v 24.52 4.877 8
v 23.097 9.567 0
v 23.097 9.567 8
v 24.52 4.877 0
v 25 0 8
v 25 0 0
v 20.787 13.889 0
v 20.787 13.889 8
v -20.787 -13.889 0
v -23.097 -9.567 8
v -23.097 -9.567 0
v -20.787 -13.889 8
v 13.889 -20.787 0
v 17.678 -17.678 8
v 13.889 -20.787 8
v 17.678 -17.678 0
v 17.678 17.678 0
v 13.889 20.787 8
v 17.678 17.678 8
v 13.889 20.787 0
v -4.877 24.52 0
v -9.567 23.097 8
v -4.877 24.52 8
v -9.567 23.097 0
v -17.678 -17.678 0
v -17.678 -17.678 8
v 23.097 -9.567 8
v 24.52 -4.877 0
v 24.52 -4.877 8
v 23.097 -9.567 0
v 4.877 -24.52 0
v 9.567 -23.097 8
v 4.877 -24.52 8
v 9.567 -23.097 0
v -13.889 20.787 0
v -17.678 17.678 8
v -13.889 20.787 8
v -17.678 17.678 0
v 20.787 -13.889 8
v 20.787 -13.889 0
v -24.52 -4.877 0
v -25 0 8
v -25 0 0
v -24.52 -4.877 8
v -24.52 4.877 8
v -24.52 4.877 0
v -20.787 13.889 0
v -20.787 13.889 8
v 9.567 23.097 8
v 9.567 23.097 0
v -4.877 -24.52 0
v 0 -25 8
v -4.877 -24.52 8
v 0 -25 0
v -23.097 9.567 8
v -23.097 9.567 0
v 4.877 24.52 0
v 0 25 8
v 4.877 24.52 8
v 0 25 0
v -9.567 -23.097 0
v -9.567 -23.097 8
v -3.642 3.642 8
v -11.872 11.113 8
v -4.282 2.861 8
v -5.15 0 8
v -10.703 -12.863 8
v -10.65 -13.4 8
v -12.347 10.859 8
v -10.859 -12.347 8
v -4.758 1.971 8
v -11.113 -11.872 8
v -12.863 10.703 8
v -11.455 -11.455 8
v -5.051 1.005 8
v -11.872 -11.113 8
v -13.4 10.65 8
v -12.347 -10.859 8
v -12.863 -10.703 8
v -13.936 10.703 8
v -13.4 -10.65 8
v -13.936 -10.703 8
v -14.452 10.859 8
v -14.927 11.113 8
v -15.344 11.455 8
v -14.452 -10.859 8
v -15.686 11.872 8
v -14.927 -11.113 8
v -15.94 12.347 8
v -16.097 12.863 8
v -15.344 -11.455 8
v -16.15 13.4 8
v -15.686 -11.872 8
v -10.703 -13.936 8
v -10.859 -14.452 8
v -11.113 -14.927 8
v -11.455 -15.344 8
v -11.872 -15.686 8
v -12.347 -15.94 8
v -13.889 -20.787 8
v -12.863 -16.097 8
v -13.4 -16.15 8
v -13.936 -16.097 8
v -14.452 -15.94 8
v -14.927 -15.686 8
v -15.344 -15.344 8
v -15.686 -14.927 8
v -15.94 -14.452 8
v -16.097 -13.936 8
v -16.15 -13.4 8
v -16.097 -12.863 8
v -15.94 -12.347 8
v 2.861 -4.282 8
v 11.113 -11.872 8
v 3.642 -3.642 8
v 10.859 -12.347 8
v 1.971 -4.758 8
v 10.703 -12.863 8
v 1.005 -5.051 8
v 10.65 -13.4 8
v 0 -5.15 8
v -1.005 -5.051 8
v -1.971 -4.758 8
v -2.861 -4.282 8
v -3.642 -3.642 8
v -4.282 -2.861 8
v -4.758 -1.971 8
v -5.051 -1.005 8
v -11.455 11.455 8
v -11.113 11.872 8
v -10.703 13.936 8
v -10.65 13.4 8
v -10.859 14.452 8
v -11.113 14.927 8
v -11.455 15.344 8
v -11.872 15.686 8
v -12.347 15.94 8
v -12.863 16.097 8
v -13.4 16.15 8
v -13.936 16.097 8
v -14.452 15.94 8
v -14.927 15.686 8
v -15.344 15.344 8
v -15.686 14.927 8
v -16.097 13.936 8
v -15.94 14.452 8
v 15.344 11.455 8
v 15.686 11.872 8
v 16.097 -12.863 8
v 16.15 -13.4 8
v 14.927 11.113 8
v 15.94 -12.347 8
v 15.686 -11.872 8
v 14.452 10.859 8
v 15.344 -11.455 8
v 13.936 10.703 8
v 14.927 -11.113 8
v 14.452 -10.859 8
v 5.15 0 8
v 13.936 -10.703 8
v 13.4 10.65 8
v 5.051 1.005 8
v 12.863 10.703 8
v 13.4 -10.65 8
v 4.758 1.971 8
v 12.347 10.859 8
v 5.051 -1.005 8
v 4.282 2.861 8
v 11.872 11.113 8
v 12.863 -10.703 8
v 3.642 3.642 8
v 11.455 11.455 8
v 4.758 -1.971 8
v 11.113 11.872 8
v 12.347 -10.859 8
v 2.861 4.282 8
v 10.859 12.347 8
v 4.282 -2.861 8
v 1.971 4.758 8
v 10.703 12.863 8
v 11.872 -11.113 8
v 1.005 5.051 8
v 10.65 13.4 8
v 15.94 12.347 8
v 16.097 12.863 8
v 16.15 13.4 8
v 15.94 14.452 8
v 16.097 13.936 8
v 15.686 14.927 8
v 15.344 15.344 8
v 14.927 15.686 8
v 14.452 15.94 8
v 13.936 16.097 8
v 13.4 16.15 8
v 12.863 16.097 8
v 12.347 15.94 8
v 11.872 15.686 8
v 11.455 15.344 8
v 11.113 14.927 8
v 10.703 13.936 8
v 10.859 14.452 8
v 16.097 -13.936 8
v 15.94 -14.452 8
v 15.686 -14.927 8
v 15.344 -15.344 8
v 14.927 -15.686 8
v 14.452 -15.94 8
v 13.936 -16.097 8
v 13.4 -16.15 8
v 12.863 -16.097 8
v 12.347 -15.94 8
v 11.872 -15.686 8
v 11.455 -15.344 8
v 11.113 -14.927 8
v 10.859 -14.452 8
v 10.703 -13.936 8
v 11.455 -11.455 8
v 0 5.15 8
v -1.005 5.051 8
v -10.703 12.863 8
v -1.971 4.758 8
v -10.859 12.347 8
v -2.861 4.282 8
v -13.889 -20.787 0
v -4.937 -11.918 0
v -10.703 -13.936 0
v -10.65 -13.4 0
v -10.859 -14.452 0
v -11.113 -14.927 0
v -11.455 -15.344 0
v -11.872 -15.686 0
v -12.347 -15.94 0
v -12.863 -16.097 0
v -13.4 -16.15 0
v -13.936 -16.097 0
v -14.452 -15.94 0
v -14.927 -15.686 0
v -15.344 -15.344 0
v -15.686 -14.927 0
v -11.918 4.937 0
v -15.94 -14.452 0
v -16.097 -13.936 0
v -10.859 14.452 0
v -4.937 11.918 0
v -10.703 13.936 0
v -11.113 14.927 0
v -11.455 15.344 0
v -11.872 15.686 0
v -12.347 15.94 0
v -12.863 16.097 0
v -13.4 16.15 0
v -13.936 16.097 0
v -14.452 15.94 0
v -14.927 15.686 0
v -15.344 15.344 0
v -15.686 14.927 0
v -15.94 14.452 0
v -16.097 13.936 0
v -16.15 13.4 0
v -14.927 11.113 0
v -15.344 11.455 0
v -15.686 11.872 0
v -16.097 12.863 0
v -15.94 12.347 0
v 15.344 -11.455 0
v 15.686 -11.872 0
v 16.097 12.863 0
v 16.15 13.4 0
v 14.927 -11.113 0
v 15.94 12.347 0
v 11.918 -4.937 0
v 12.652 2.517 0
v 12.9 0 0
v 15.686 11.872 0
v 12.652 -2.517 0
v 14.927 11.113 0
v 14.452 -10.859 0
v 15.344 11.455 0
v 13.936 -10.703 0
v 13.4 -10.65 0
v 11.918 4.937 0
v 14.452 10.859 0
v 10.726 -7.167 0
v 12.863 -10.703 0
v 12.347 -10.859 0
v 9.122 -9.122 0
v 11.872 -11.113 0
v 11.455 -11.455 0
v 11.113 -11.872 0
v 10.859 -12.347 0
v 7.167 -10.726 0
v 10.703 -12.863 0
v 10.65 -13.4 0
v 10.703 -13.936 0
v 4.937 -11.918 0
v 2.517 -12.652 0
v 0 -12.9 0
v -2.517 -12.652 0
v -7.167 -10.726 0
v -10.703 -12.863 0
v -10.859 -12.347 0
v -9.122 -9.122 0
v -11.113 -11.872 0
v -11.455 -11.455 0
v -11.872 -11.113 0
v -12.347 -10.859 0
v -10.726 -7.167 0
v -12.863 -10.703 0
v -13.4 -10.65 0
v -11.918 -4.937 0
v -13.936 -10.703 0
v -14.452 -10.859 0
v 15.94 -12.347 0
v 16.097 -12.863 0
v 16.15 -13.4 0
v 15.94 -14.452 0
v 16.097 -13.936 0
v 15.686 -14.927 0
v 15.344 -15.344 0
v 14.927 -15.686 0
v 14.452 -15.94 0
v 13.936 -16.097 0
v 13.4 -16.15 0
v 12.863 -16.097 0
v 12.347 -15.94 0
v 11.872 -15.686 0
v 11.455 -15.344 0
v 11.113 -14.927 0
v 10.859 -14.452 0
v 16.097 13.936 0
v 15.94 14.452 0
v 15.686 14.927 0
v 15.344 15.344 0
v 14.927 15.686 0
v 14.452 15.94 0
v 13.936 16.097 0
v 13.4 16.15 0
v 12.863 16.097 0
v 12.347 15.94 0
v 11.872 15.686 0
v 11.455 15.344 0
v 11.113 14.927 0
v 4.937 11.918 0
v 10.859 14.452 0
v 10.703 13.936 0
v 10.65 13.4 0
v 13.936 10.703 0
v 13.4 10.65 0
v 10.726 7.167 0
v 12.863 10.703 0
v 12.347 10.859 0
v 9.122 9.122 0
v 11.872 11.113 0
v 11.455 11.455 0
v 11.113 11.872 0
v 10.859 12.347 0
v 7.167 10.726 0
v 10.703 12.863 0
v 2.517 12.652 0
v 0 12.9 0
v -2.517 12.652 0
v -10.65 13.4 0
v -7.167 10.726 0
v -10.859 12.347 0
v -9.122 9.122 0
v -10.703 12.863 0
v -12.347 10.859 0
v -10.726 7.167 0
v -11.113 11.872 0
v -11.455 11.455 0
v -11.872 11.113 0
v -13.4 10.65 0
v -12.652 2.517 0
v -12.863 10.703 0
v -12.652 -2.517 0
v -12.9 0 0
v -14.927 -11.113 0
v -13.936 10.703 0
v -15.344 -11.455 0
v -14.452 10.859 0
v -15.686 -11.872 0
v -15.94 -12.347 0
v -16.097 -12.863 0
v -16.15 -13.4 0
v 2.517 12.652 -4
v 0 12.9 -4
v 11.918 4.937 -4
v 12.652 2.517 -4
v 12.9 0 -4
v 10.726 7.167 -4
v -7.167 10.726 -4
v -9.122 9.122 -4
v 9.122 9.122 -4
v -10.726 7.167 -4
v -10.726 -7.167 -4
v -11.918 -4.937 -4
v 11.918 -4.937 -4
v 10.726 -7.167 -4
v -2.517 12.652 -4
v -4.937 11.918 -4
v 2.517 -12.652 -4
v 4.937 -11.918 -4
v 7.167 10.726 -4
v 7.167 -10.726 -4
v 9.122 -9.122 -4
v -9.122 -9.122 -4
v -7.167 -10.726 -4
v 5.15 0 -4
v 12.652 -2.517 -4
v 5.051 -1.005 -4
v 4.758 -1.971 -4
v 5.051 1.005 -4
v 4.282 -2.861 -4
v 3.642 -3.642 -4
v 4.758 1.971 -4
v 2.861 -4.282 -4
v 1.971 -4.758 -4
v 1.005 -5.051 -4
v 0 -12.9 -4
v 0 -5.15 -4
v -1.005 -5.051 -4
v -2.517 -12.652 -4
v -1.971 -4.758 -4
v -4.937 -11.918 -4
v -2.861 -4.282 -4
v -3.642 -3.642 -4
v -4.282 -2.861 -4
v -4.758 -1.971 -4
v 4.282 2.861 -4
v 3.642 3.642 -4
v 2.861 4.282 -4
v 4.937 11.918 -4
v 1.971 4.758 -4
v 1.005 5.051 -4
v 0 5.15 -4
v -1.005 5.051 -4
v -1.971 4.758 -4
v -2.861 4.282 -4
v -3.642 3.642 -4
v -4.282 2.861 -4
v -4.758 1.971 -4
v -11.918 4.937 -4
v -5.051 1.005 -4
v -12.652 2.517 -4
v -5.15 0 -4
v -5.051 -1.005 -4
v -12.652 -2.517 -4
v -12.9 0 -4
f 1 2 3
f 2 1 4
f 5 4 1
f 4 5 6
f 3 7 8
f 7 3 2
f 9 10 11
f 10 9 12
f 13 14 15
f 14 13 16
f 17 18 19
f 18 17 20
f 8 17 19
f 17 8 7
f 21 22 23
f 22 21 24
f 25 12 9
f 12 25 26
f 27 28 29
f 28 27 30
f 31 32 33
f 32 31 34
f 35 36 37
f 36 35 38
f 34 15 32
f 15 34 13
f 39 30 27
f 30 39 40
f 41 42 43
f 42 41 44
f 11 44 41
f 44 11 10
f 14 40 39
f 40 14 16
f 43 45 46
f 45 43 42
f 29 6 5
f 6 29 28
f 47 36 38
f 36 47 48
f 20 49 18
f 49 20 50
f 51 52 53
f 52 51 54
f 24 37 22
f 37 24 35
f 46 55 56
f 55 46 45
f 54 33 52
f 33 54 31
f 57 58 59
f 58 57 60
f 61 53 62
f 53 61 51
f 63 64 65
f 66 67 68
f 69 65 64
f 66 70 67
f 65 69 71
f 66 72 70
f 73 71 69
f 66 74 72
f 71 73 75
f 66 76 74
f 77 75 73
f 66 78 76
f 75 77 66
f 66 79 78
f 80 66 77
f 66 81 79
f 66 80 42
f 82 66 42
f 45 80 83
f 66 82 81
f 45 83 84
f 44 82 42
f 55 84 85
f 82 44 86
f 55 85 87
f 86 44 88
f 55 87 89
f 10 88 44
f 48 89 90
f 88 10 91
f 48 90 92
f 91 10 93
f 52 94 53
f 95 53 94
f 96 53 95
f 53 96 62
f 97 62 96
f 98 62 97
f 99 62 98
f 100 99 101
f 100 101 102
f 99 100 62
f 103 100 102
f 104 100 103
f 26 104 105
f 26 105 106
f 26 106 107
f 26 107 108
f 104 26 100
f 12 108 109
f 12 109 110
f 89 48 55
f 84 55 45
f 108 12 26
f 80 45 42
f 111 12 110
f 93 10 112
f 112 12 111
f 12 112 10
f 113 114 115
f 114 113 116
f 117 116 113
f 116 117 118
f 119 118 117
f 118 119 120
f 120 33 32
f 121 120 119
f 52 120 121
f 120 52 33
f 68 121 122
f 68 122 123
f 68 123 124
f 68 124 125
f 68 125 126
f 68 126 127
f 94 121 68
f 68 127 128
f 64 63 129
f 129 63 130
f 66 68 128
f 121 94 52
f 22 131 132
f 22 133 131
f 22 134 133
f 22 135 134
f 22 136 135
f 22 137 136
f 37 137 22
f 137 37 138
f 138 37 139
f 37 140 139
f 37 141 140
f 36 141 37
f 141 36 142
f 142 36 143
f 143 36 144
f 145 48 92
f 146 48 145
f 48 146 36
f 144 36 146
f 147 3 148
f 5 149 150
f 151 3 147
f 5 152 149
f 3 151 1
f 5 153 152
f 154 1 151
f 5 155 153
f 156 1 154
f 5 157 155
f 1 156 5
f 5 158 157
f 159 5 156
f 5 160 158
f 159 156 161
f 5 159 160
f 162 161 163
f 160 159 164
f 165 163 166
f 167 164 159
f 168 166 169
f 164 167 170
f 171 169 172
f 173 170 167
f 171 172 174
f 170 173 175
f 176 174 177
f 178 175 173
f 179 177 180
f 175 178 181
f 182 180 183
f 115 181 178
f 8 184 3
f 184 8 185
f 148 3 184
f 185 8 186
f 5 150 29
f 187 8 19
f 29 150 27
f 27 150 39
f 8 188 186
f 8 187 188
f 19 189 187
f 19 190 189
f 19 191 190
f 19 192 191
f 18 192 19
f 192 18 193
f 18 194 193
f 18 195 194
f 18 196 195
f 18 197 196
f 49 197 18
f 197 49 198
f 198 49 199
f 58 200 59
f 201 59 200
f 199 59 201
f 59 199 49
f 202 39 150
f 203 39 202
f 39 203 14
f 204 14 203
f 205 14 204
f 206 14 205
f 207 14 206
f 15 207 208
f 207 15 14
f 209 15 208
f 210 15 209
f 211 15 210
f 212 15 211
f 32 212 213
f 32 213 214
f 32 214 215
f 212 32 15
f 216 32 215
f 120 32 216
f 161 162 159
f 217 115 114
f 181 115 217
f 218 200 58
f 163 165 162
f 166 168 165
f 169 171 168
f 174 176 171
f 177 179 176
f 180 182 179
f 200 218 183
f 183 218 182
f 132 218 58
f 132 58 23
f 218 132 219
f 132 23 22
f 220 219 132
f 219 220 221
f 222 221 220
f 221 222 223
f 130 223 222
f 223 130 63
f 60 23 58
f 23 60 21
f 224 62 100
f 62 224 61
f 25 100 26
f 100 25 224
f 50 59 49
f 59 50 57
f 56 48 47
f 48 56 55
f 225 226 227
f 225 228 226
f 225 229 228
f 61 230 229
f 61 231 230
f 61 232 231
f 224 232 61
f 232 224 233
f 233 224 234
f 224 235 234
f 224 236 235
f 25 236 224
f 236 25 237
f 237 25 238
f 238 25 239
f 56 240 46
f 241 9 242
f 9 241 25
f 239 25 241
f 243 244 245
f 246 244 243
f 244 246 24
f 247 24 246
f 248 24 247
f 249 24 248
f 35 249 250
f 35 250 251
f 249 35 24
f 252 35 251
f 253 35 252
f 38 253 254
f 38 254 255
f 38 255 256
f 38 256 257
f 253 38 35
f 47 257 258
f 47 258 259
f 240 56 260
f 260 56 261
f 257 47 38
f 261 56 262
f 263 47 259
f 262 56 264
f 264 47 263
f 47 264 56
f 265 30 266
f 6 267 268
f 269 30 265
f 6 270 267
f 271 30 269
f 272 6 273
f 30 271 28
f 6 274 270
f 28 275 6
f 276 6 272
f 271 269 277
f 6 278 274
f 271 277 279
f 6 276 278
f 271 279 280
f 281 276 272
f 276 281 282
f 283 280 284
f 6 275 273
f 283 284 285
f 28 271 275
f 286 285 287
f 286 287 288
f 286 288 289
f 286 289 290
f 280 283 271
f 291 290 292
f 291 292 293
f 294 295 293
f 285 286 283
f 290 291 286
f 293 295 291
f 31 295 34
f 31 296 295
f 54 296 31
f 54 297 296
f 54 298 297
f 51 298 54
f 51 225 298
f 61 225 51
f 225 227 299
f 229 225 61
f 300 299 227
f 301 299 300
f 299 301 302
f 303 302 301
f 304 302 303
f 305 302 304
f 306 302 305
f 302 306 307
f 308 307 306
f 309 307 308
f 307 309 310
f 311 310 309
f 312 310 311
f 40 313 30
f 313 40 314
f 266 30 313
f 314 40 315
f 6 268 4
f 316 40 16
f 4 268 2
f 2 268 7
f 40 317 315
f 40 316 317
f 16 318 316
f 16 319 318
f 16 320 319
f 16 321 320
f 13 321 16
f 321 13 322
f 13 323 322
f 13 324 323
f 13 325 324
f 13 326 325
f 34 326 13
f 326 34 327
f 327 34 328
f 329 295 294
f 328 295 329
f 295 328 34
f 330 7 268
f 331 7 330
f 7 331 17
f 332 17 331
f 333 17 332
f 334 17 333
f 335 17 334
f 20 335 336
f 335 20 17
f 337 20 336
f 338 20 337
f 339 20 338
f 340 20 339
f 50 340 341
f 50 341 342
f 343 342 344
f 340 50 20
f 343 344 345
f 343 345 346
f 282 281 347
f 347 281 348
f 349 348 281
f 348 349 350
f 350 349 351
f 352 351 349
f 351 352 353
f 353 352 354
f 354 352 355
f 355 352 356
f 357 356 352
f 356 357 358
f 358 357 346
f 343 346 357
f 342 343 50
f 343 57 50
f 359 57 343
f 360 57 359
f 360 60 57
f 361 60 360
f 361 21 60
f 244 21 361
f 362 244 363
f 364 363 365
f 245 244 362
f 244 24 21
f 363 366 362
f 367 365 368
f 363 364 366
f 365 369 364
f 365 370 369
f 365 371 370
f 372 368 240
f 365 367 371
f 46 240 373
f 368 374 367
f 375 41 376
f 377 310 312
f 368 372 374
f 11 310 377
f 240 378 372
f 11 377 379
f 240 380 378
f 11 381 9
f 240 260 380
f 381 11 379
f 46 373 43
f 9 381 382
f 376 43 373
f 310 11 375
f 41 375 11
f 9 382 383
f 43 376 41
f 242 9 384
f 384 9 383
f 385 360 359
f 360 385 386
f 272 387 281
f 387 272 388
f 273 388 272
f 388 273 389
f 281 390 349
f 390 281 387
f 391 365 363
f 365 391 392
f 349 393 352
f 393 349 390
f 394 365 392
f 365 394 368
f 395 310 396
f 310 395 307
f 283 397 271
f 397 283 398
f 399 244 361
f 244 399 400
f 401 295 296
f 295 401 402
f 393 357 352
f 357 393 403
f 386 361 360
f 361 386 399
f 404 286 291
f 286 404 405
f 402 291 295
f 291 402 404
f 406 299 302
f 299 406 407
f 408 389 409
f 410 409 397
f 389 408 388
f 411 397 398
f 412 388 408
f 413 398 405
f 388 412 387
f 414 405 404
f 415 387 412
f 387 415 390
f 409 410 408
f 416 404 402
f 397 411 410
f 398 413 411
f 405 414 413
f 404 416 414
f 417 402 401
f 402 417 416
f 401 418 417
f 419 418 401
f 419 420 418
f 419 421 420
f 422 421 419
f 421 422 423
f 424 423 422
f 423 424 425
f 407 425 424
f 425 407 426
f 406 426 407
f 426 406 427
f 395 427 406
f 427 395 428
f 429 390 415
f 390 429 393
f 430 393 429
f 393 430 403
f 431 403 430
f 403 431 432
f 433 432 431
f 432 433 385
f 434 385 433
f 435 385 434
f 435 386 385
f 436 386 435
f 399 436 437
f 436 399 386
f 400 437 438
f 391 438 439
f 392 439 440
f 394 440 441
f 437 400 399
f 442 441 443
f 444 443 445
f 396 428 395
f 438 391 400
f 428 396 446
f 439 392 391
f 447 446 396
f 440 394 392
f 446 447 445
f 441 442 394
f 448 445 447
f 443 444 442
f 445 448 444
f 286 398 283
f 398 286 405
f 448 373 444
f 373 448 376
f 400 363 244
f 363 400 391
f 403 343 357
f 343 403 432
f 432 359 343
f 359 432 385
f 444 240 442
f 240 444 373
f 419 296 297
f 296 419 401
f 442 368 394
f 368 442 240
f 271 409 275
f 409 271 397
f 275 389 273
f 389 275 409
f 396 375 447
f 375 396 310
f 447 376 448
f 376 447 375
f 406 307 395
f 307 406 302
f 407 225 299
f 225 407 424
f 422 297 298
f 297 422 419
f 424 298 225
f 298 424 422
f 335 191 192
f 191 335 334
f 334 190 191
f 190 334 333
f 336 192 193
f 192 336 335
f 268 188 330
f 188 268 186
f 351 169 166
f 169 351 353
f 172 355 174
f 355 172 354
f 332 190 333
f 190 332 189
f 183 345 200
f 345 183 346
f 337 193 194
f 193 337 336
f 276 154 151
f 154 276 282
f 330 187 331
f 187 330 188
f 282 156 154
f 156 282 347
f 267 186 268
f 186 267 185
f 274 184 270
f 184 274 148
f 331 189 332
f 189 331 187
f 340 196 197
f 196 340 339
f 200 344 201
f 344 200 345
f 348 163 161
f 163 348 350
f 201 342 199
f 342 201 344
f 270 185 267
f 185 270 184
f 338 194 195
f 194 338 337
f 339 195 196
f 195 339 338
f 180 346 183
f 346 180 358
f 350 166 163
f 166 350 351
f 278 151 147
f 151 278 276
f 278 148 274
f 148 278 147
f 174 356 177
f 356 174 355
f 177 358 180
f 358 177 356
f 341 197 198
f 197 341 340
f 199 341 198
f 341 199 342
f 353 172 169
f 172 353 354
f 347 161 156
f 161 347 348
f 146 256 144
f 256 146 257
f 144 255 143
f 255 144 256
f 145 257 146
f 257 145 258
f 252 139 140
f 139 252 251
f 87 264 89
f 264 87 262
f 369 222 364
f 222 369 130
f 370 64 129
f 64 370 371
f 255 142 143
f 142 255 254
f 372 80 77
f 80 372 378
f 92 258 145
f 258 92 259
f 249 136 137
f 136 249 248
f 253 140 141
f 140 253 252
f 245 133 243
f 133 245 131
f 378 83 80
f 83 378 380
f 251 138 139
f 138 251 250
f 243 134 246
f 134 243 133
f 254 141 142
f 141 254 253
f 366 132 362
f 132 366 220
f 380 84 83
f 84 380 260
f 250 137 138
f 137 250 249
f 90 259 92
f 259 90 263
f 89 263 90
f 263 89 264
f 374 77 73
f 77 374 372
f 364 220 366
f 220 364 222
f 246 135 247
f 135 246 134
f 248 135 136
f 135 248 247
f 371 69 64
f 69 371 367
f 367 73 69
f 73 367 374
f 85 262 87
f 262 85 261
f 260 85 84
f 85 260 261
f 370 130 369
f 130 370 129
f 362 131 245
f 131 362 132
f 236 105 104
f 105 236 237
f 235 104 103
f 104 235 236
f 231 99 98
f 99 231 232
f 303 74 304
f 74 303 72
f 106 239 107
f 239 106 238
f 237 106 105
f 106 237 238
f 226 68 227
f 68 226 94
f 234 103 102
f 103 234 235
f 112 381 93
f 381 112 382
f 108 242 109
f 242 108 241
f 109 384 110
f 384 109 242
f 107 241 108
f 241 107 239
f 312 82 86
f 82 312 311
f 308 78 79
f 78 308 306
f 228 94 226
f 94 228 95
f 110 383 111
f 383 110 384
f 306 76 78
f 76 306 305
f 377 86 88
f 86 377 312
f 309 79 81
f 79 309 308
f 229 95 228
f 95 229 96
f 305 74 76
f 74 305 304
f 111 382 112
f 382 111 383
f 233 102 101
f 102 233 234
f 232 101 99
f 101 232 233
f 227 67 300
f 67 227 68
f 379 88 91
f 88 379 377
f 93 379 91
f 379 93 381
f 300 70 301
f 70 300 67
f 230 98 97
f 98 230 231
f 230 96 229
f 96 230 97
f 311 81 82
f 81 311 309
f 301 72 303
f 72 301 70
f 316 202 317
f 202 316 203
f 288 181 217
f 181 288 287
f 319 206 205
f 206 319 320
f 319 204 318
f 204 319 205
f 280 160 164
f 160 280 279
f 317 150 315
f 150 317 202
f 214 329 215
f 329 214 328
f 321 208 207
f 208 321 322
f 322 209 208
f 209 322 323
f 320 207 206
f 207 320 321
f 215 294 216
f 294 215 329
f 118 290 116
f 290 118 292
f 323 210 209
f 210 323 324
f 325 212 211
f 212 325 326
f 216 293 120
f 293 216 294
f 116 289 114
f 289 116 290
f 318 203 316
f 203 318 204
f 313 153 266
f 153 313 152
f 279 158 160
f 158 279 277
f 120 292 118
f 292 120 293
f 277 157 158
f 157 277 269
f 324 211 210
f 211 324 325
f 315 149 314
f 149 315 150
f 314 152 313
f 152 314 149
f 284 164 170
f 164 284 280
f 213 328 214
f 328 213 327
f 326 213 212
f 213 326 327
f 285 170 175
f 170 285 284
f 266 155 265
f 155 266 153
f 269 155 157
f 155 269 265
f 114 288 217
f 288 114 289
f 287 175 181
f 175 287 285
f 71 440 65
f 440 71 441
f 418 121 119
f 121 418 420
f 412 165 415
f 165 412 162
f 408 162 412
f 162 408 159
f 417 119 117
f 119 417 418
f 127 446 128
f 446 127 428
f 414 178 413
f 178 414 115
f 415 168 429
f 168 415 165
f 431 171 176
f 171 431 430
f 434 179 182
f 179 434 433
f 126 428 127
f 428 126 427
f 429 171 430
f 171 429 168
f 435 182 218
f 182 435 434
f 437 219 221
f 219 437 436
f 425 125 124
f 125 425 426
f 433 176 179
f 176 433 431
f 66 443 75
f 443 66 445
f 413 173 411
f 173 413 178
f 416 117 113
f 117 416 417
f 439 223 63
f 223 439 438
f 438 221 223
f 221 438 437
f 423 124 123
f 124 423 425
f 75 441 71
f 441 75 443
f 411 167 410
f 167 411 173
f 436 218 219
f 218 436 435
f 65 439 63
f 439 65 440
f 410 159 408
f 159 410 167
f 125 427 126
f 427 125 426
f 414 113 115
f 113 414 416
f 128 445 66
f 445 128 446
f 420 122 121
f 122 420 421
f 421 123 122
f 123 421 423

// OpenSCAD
$fn = 32;

// ----------------------------------------------------------------------
// Retaining cap: 6000 cover, 50 mm, spigot 25.8 mm
// ----------------------------------------------------------------------

// --- parameters (mm) ---
plate_d = 50;             // cover diameter
plate_t = 8;              // cover thickness
boss_d = 25.8;            // spigot that enters the housing
boss_h = 4;               // spigot height
shaft_d = 10.3;           // shaft opening
bolt_d = 5.5;             // bolt clearance
bolt_r = 18.95;           // bolt circle radius

module cover() {
  cylinder(h = plate_t, d = plate_d);
}

module spigot() {
  /* sunk 1 mm into the cover; the spigot sets the overall height */
  translate([0, 0, -boss_h]) cylinder(h = boss_h + 1, d = boss_d);
}

difference() {
  union() {
    cover();
    spigot();
  }
  for (i = [0 : 3]) rotate([0, 0, 45 + i * 90]) translate([bolt_r, 0, -boss_h - 1])
    cylinder(h = boss_h + plate_t + 2, d = bolt_d);
  translate([0, 0, -boss_h - 1]) cylinder(h = boss_h + plate_t + 2, d = shaft_d);
}
